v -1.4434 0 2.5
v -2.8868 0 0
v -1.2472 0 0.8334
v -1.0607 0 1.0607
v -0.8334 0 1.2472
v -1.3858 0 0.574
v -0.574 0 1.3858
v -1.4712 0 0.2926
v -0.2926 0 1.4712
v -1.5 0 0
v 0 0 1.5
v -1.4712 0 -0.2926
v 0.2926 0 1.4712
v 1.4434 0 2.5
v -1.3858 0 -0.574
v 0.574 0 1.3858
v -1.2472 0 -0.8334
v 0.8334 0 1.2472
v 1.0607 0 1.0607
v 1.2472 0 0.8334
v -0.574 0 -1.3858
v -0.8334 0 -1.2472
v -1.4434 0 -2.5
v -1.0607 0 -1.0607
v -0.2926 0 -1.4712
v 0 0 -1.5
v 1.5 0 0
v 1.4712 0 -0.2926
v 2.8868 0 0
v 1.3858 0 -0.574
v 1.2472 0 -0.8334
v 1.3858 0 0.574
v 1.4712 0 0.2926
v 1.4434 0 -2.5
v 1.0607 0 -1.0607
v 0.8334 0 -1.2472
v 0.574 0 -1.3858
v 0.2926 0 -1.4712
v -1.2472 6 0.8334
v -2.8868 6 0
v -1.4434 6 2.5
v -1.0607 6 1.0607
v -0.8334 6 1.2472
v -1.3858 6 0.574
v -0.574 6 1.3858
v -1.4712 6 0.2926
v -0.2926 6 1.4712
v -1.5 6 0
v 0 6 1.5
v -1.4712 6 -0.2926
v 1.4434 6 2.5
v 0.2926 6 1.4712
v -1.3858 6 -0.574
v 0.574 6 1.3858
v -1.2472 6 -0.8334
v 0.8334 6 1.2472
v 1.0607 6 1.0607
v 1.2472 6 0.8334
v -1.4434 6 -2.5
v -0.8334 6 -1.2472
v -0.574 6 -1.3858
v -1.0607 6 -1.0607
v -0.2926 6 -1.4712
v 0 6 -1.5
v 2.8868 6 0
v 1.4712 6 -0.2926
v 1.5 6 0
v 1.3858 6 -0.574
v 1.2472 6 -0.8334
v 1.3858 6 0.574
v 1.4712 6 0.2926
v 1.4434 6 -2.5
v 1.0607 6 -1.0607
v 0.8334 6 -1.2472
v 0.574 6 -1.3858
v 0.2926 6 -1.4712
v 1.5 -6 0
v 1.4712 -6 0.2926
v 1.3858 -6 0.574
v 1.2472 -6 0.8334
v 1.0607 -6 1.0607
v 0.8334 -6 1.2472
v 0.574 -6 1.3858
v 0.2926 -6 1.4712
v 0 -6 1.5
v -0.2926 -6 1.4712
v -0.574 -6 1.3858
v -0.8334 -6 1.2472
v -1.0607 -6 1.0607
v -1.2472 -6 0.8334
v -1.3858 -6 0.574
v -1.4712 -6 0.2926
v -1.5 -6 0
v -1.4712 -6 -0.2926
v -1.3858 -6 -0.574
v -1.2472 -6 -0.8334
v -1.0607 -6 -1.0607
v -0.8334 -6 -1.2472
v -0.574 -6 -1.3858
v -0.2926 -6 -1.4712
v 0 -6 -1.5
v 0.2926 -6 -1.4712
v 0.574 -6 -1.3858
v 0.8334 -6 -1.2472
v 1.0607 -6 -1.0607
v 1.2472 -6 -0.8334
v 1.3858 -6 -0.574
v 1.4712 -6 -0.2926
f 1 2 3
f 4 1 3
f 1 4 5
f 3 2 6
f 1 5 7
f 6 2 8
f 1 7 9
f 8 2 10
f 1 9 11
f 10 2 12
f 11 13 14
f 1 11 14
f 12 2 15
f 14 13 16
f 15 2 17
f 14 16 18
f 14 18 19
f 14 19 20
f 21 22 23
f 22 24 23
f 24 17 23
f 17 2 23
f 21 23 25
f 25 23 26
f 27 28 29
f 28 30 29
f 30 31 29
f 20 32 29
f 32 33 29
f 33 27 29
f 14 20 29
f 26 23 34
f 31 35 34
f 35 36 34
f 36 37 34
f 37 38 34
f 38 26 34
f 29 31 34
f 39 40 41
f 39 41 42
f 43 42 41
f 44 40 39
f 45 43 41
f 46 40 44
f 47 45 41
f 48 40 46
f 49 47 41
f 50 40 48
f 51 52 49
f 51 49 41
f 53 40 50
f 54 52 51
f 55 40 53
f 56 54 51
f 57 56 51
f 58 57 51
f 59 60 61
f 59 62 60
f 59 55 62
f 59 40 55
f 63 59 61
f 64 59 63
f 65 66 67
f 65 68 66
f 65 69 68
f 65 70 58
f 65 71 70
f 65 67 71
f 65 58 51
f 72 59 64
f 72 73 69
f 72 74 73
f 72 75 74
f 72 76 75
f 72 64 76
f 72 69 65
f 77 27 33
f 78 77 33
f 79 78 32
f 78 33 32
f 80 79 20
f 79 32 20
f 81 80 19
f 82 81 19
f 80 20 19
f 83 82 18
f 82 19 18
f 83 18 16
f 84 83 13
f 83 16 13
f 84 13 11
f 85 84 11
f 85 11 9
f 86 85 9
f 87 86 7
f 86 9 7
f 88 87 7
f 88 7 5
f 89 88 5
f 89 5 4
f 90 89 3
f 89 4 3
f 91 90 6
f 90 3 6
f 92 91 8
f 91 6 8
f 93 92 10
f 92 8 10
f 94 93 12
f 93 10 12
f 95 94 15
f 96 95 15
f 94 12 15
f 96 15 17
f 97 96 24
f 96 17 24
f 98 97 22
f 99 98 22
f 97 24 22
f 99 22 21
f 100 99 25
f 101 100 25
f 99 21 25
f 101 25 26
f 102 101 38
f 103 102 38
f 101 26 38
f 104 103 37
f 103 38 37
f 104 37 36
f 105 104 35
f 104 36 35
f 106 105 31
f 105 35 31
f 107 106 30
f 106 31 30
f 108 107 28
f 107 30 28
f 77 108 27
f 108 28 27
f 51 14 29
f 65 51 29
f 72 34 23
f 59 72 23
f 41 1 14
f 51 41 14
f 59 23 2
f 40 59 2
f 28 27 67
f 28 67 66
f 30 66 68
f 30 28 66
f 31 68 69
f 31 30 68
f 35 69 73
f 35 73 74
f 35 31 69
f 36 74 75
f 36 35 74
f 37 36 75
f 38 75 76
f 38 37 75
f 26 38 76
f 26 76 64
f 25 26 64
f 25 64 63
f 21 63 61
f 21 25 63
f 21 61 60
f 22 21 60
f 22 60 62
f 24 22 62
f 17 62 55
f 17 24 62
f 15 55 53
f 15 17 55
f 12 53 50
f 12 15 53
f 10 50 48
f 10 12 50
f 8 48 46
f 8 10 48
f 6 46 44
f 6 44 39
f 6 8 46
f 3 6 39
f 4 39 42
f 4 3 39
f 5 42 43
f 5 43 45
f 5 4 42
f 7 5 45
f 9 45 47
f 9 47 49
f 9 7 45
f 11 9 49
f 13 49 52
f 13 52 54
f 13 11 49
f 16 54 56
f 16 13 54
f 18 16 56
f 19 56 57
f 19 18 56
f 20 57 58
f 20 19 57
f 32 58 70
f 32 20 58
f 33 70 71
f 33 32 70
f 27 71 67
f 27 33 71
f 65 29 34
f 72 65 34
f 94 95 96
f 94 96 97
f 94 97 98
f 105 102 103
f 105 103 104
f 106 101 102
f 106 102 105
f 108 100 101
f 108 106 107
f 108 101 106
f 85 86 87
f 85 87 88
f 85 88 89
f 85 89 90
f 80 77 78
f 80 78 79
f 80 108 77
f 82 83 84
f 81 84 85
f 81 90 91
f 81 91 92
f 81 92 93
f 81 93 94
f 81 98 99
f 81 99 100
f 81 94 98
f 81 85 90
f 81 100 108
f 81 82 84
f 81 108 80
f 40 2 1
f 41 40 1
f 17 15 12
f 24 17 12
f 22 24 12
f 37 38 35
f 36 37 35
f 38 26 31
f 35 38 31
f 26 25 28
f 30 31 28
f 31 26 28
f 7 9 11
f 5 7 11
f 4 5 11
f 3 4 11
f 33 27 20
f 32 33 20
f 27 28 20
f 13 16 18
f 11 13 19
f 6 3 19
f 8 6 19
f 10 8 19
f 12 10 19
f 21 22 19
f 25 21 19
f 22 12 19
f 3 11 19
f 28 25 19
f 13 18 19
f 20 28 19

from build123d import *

# Parameters (mm, degrees)
CROQUIS1_R              = 1.5
SALIENTE_EXTRUIR1_DEPTH = 6
CROQUIS2_R              = 1.5
SALIENTE_EXTRUIR2_DEPTH = 6


with BuildPart() as part:
    # Croquis1 → Saliente-Extruir1 (new body)
    with BuildSketch(Plane(origin=(0, 0, 0), x_dir=(1, 0, 0), z_dir=(0, 1, 0))):
        Polygon((1.443375673, -2.5), (2.886751346, 0), (1.443375673, 2.5), (-1.443375673, 2.5), (-2.886751346, 0), (-1.443375673, -2.5), align=None)
        Circle(CROQUIS1_R, mode=Mode.SUBTRACT)
    extrude(amount=SALIENTE_EXTRUIR1_DEPTH)


with BuildPart() as body_2:
    # Croquis2 → Saliente-Extruir2 (new body)
    with BuildSketch(Plane.XZ):
        Circle(CROQUIS2_R)
    extrude(amount=SALIENTE_EXTRUIR2_DEPTH)


solid = Compound([part.part, body_2.part])
